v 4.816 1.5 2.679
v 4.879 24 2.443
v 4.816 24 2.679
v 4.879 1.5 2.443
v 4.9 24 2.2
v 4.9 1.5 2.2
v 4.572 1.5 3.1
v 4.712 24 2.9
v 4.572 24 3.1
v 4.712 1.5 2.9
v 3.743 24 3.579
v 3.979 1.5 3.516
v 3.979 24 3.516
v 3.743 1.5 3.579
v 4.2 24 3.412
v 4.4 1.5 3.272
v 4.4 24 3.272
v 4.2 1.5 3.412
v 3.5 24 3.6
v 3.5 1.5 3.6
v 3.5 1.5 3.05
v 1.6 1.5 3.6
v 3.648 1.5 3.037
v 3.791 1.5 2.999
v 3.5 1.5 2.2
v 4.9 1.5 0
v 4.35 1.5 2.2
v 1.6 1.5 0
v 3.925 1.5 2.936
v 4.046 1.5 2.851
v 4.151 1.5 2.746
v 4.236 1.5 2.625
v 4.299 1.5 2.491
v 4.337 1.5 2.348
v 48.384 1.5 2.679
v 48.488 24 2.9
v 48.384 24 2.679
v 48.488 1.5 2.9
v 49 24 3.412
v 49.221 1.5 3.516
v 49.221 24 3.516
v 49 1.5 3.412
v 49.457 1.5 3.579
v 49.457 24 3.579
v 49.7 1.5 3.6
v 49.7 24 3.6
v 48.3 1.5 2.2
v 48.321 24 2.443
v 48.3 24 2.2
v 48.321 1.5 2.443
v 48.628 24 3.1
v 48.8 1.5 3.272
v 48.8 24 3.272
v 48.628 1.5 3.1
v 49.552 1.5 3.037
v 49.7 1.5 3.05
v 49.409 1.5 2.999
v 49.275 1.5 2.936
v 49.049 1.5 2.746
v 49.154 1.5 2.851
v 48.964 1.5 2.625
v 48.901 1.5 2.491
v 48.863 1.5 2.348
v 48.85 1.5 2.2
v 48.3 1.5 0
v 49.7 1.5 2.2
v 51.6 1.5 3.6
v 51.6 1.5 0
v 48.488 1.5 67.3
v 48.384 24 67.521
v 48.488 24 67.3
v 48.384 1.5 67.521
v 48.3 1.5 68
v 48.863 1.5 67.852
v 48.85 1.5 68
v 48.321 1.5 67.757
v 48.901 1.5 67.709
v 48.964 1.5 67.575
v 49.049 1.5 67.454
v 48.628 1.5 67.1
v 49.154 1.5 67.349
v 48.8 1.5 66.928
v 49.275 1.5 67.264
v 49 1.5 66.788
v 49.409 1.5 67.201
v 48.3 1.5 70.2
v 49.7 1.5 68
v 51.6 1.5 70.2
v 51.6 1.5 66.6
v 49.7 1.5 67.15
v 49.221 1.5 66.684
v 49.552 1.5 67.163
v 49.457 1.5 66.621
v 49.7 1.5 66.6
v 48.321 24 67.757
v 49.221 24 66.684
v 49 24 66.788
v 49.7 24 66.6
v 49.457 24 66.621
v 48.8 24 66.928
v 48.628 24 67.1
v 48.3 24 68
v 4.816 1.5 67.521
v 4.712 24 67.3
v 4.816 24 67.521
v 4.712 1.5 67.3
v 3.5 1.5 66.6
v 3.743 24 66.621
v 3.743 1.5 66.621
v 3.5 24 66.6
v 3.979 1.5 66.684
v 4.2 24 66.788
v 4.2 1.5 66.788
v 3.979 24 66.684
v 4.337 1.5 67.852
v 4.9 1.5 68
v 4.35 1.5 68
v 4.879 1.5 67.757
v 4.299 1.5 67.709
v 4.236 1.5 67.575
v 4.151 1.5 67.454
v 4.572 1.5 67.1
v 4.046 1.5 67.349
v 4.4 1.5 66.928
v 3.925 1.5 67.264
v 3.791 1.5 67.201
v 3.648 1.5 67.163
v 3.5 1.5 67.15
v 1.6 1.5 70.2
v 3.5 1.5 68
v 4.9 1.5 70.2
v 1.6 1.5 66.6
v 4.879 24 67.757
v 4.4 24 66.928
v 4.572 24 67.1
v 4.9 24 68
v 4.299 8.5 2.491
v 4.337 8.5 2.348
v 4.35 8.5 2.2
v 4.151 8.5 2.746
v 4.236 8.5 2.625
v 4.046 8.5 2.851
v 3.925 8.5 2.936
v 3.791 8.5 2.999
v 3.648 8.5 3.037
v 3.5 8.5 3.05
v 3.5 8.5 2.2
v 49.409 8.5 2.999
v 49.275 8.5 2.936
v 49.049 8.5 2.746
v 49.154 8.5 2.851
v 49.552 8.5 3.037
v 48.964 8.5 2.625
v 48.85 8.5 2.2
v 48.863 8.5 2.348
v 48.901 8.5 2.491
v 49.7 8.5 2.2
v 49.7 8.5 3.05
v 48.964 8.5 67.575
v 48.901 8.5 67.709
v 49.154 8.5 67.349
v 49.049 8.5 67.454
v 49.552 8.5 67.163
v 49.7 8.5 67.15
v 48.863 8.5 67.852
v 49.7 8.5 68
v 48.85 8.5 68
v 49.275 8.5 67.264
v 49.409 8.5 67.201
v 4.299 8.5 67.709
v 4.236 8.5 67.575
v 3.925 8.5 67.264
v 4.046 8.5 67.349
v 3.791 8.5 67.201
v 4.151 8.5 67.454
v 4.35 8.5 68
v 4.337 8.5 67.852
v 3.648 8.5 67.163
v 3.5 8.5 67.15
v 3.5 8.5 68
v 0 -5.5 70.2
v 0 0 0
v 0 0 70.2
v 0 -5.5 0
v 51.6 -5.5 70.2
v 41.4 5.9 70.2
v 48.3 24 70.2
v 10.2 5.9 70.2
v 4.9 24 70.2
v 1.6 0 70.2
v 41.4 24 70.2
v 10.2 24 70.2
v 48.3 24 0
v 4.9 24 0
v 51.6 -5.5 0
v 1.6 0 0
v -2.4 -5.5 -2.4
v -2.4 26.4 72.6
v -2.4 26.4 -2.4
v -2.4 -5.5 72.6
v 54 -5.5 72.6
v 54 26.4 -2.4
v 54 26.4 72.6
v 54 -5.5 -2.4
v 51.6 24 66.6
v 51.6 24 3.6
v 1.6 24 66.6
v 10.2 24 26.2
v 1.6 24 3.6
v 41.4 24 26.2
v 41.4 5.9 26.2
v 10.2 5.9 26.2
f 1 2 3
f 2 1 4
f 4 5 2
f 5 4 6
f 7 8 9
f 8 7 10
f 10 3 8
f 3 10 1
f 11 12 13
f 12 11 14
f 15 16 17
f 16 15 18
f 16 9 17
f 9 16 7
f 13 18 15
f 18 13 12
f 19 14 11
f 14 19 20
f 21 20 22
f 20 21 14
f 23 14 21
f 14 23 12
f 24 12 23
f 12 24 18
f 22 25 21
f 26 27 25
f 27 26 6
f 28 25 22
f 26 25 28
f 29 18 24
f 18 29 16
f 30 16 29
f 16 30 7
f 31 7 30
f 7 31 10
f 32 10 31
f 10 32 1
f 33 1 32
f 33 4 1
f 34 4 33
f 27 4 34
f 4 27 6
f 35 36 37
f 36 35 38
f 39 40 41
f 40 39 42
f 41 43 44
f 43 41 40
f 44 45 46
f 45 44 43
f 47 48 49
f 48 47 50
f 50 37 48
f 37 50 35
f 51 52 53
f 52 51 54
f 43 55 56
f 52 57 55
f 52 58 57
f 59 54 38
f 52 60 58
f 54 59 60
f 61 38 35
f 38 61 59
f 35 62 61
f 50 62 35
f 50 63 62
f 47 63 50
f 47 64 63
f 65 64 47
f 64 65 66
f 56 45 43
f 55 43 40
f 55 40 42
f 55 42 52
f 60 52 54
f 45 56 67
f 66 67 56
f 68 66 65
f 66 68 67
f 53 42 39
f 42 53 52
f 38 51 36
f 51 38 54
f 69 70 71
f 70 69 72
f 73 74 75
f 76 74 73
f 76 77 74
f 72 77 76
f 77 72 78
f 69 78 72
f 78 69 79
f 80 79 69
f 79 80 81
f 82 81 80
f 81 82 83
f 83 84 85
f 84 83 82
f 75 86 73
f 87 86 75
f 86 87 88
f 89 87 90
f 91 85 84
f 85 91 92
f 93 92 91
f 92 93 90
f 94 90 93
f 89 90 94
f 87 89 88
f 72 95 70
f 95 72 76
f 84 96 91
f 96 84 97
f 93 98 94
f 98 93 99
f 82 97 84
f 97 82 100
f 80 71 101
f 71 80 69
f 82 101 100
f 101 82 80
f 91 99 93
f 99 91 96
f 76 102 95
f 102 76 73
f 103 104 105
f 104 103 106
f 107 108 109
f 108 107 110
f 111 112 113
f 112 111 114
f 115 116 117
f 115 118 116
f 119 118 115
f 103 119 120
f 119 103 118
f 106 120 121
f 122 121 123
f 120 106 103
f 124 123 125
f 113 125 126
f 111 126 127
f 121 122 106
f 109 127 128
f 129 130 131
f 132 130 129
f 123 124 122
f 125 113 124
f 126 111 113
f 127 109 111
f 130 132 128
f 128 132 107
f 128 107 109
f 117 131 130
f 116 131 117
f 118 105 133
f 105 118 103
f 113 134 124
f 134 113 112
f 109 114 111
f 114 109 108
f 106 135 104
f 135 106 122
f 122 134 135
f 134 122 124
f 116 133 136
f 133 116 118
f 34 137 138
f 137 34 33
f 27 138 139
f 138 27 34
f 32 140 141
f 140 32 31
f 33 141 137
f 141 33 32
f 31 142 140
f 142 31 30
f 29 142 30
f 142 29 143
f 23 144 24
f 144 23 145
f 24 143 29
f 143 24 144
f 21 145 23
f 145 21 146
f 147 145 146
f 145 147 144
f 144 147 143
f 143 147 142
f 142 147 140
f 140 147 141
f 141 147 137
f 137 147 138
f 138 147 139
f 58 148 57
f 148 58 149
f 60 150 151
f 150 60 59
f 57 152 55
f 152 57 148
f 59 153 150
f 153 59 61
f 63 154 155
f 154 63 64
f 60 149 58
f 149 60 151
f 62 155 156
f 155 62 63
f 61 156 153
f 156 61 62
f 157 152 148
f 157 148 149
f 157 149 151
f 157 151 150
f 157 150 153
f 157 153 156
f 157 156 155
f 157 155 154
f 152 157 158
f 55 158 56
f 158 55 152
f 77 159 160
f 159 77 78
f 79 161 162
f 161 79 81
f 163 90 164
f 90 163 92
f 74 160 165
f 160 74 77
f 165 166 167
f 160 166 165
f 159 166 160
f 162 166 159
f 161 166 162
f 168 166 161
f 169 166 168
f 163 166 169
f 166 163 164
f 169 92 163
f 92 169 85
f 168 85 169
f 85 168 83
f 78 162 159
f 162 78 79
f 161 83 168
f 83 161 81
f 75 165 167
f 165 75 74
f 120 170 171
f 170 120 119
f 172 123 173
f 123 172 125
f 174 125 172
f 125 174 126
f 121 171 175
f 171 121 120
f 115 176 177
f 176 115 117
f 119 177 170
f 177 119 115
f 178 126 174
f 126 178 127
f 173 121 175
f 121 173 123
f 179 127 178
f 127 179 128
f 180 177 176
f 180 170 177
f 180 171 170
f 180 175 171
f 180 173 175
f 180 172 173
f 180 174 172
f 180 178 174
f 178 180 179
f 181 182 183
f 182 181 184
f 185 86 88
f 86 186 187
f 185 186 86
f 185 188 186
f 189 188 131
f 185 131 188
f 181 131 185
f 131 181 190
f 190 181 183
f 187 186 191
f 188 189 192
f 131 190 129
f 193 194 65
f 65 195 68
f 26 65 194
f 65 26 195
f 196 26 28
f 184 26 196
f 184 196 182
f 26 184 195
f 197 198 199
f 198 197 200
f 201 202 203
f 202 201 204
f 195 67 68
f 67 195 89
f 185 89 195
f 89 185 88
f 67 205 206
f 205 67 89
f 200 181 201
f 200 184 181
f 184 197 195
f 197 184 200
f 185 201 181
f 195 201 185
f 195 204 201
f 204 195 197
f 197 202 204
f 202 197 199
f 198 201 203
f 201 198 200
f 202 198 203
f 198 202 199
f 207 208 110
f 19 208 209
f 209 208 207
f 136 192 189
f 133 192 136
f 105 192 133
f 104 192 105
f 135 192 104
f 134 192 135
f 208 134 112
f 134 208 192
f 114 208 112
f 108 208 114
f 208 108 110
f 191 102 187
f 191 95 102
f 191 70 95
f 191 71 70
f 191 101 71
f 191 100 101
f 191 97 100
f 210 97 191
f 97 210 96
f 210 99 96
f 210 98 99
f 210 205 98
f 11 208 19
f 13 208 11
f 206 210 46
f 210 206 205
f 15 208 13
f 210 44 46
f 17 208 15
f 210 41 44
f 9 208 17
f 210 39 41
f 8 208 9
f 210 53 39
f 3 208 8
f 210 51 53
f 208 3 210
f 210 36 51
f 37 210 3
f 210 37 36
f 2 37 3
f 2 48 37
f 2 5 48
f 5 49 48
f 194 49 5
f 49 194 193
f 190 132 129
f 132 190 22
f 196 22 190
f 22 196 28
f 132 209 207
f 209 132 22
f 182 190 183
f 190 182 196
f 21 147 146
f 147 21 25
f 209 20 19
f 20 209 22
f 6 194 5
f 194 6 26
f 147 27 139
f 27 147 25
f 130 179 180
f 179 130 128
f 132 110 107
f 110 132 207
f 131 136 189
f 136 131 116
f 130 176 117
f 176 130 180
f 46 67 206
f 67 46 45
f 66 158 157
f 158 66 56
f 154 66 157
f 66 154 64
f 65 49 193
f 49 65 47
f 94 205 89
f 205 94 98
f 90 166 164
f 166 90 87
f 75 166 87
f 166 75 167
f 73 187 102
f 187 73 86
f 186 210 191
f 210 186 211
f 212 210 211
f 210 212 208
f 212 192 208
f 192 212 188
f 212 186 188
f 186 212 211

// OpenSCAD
$fn=36;

$sl = 7; //schraubenlänge gesamt
$sk = 1.5; //schraube kopfdicke
$pd = 1.5; //plattinendicke
$ledh = 7 - $pd; //led höhe
echo ("ledh: ", $ledh);

$lsqa = 45; //breite und höhe led leucht fläche

//50*70.2 //platinenmaße
$pb = 50;
$ph = 70.2;
$z=5.2;//abstand oben led quadratfläche
$x=1.7;//abstand links led quadratfläche
$agesamt=$pb-$lsqa;//
$x2=$agesamt-$x;
echo ("agesamt: ", $agesamt);
echo ("x2: ", $x2);
$ad=$agesamt/2; //durchschnittsabstand
echo ("ad: ", $ad);
$ax=$x2-$x; //zusatzshift ist durschschnittsabstand (also soll - tatsächlichen abstand
//falsch, da wir ja immer rechts mehr als den durschschnittsabstand haben, müssen wir schauen, dass wir links auf die breite von rechts kommen, der versinkt ja nirgends
echo ("ax: ", $ax);

$depth = 24; //tiefe von platine bis tiefsten bauteil (schalter)

$t=2.4;

$lr2lrh = 68; //loch von außenrand zu außenrand => mit platinenmaßen und loch durchmesser kann abstand von außen berechnet werden
$lr2lrb = 48.4;
$rb = ($pb-$lr2lrb)/2; //rand breite (lochabstand)
$rh = ($ph-$lr2lrh)/2; //rand breite (lochabstand)

$ld = 2.2; //loch durchmesser schrauben von platine
$lds = 1.7; //schraube selbst durchmesser
$mr = 2.8; //maximaler Radius von zentrum platinenloch bis zur nähesten lötstelle

$lswd = 5.8; //durchmesser switch loch
$lstd = 7.8; //durchmesser stecker loch


$hw = 4.8 - $pd; //hoehe widerstände, lötseite brauche ich nicht, da hier die schauben eh länger sind als benötigt

$loetd = 4; //doch lieber einkalkulieren, mit der 9v batterie könnte es dann doch eng werden

$mra = 1.4; //minimaler rand (links von vorne)

$schalter = 13; //höhe und breite schalter

$ast = $schalter + 2 - $lstd/2; //abstand stecker + switch, da switch 13 (mit toleranz 15)

/* [Wände] */
$platine = false;
$waende = true;
$rueckwand = true;
$loetzinn = false;

////////////////////
// Modules
////////////////////

module loch($h,$d,$y)
{
    translate([0,$y+$pd,0])
    rotate([90,0,0])
    cylinder(h=$h,d1=$d,d2=$d);
}

module platinenloch()
{
    loch($pd,$ld,0);
}

module platine()
{
    if ($platine)
    {
        color("green")
        cube([$pb,$pd,$ph]);
    }
    
    if ($platine)
    {
        loecher()
        {
            color("orange")
            platinenloch();
        }
    }
    
    loecher()
    {
        color("gray")
        loch($sl,$lds,$sl);
    }
}

module loecher()
{
    translate([$ld/2+$rb,0,$ld/2+$rh])
    children(0);
    
    translate([$pb-$ld/2-$rb,0,$ld/2+$rh])
    children(0);
    
    translate([$pb-$ld/2-$rb,0,$ph-$ld/2-$rh])
    children(0);
    
    translate([$ld/2+$rb,0,$ph-$ld/2-$rh])
    children(0);  
}

module platinenzentrum()
{
    difference()
    {
color("blue")
loecher()
        
        
    
{
    loch($depth,$mr,$depth);
}
platine();
}

if ($platine)
{
//LEDs
color("white")
translate([$x,-$ledh,$ph-$lsqa-$z])
cube([$lsqa,$ledh,$lsqa]);
}
}

if ($loetzinn)
{
//Lötzinn
color("gray")
translate([$ax+$mra/2,$pd,$mra/2])
cube([$pb-$mra,$loetd,$ph-$mra]);
}

translate([$ax,0,0])
platinenzentrum();

if ($waende)
{
//Wände
//links
translate([-$t,$pd,0])
cube([$t,$depth,$ph]);
//rechts
translate([$pb+$ax,$pd,0])
cube([$t,$depth,$ph]);

//links
color("pink")
translate([-$t,-$ledh,0])
cube([$t,$pd+$ledh,$ph]);
//rechts
color("pink")
translate([$pb+$ax,-$ledh,0])
cube([$t,$pd+$ledh,$ph]);

//unten
color("#FF0000")
translate([-$t,-$ledh,-$t])
cube([$t+$pb+$ax+$t,$pd+$ledh,$t]);

//oben
color("#FF0000")
translate([-$t,-$ledh,$ph])
cube([$t+$pb+$ax+$t,$pd+$ledh,$t]);

//unten
color("#FF4444")
translate([-$t,$pd,-$t])
cube([$t+$pb+$ax+$t,$depth,$t]);

//oben
color("#FF4444")
translate([-$t,$pd,$ph])
cube([$t+$pb+$ax+$t,$depth,$t]);
}

if ($rueckwand)
{
//hinten
color("#FF8888") //absichtlich, damit perspektive von vorne besser mittigkeit von leds beurteilen lässt
translate([-$t,$depth,-$t])
cube([$t+$pb+$ax+$t,$t,$t+$ph+$t]);
}

//platinenersatz
//damit kein staub rein kommt, könnten wir ja links den schlitz zudrucken, mit einem stück was ax füllt und so dick ist wie die platine
color("#44FF44")
cube([$ax,$pd+$depth, $ph]); //das muss bis hinter, sonst muss ich support drucken

//loch stecker
translate([$ast+$ax,0,$ast])
color("#AA88FF")
loch($t,$lstd,$depth+$t-$pd);

//loch schalter
translate([$pb-$ast,0,$ast])
color("#AA8822")
loch($t,$lswd,$depth+$t-$pd);


//platinenhalter zum rand
color("#AAAAFF")
translate([$ax,$pd,0])
cube([$rb+$ld+($mr-$ld)/2-$mr/2,$depth,$rh+$ld+($mr-$ld)/2]);

color("#AAAAFF")
translate([$ax,$pd,0])
cube([$rb+$ld+($mr-$ld)/2,$depth,$rh+$ld+($mr-$ld)/2-$mr/2]);

color("#AAAAFF")
translate([$ax,$pd,$ph-($rh+$ld+($mr-$ld)/2)])
cube([$rb+$ld+($mr-$ld)/2-$mr/2,$depth,$rh+$ld+($mr-$ld)/2]);

color("#AAAAFF")
translate([$ax,$pd,$ph-($rh+$ld+($mr-$ld)/2-$mr/2)])
cube([$rb+$ld+($mr-$ld)/2,$depth,$rh+$ld+($mr-$ld)/2-$mr/2]);

color("#AAAAFF")
translate([($ax+$pb)-($rb+$ld+($mr-$ld)/2-$mr/2),$pd,0])
cube([$rb+$ld+($mr-$ld)/2-$mr/2,$depth,$rh+$ld+($mr-$ld)/2]);

color("#AAAAFF")
translate([($ax+$pb)-($rb+$ld+($mr-$ld)/2),$pd,0])
cube([$rb+$ld+($mr-$ld)/2,$depth,$rh+$ld+($mr-$ld)/2-$mr/2]);

color("#AAAAFF")
translate([($ax+$pb)-($rb+$ld+($mr-$ld)/2-$mr/2),$pd,$ph-($rh+$ld+($mr-$ld)/2)])
cube([$rb+$ld+($mr-$ld)/2-$mr/2,$depth,$rh+$ld+($mr-$ld)/2]);

color("#AAAAFF")
translate([($ax+$pb)-($rb+$ld+($mr-$ld)/2),$pd,$ph-($rh+$ld+($mr-$ld)/2-$mr/2)])
cube([$rb+$ld+($mr-$ld)/2,$depth,$rh+$ld+($mr-$ld)/2-$mr/2]);

//9v batterie (oben muss er durchstoßen, aber hinten nehmen wir einfach die Wand die eh schon da ist)
$9vb=26.4; //wiki 26.2
$9vd=17.2; //wiki 17
$9vh=44; //wiki 48.5 aber wir wollen ja, dass er oben raussteht
color("#973512")
translate([(($ax+$pb)-$9vb)/2,$pd+$depth-$9vd,($ph-$9vh)+$t])
cube([$9vb,$9vd,$9vh]);

//9v batteriefach
$9vbs=$9vb+$t*2;
$9vds=$9vd+$t;
$9vhs=$9vh+$t;
color("#351297")
translate([(($ax+$pb)-$9vbs)/2,$pd+$depth-$9vds,($ph-$9vhs)+$t])
cube([$9vbs,$9vds,$9vhs]);
